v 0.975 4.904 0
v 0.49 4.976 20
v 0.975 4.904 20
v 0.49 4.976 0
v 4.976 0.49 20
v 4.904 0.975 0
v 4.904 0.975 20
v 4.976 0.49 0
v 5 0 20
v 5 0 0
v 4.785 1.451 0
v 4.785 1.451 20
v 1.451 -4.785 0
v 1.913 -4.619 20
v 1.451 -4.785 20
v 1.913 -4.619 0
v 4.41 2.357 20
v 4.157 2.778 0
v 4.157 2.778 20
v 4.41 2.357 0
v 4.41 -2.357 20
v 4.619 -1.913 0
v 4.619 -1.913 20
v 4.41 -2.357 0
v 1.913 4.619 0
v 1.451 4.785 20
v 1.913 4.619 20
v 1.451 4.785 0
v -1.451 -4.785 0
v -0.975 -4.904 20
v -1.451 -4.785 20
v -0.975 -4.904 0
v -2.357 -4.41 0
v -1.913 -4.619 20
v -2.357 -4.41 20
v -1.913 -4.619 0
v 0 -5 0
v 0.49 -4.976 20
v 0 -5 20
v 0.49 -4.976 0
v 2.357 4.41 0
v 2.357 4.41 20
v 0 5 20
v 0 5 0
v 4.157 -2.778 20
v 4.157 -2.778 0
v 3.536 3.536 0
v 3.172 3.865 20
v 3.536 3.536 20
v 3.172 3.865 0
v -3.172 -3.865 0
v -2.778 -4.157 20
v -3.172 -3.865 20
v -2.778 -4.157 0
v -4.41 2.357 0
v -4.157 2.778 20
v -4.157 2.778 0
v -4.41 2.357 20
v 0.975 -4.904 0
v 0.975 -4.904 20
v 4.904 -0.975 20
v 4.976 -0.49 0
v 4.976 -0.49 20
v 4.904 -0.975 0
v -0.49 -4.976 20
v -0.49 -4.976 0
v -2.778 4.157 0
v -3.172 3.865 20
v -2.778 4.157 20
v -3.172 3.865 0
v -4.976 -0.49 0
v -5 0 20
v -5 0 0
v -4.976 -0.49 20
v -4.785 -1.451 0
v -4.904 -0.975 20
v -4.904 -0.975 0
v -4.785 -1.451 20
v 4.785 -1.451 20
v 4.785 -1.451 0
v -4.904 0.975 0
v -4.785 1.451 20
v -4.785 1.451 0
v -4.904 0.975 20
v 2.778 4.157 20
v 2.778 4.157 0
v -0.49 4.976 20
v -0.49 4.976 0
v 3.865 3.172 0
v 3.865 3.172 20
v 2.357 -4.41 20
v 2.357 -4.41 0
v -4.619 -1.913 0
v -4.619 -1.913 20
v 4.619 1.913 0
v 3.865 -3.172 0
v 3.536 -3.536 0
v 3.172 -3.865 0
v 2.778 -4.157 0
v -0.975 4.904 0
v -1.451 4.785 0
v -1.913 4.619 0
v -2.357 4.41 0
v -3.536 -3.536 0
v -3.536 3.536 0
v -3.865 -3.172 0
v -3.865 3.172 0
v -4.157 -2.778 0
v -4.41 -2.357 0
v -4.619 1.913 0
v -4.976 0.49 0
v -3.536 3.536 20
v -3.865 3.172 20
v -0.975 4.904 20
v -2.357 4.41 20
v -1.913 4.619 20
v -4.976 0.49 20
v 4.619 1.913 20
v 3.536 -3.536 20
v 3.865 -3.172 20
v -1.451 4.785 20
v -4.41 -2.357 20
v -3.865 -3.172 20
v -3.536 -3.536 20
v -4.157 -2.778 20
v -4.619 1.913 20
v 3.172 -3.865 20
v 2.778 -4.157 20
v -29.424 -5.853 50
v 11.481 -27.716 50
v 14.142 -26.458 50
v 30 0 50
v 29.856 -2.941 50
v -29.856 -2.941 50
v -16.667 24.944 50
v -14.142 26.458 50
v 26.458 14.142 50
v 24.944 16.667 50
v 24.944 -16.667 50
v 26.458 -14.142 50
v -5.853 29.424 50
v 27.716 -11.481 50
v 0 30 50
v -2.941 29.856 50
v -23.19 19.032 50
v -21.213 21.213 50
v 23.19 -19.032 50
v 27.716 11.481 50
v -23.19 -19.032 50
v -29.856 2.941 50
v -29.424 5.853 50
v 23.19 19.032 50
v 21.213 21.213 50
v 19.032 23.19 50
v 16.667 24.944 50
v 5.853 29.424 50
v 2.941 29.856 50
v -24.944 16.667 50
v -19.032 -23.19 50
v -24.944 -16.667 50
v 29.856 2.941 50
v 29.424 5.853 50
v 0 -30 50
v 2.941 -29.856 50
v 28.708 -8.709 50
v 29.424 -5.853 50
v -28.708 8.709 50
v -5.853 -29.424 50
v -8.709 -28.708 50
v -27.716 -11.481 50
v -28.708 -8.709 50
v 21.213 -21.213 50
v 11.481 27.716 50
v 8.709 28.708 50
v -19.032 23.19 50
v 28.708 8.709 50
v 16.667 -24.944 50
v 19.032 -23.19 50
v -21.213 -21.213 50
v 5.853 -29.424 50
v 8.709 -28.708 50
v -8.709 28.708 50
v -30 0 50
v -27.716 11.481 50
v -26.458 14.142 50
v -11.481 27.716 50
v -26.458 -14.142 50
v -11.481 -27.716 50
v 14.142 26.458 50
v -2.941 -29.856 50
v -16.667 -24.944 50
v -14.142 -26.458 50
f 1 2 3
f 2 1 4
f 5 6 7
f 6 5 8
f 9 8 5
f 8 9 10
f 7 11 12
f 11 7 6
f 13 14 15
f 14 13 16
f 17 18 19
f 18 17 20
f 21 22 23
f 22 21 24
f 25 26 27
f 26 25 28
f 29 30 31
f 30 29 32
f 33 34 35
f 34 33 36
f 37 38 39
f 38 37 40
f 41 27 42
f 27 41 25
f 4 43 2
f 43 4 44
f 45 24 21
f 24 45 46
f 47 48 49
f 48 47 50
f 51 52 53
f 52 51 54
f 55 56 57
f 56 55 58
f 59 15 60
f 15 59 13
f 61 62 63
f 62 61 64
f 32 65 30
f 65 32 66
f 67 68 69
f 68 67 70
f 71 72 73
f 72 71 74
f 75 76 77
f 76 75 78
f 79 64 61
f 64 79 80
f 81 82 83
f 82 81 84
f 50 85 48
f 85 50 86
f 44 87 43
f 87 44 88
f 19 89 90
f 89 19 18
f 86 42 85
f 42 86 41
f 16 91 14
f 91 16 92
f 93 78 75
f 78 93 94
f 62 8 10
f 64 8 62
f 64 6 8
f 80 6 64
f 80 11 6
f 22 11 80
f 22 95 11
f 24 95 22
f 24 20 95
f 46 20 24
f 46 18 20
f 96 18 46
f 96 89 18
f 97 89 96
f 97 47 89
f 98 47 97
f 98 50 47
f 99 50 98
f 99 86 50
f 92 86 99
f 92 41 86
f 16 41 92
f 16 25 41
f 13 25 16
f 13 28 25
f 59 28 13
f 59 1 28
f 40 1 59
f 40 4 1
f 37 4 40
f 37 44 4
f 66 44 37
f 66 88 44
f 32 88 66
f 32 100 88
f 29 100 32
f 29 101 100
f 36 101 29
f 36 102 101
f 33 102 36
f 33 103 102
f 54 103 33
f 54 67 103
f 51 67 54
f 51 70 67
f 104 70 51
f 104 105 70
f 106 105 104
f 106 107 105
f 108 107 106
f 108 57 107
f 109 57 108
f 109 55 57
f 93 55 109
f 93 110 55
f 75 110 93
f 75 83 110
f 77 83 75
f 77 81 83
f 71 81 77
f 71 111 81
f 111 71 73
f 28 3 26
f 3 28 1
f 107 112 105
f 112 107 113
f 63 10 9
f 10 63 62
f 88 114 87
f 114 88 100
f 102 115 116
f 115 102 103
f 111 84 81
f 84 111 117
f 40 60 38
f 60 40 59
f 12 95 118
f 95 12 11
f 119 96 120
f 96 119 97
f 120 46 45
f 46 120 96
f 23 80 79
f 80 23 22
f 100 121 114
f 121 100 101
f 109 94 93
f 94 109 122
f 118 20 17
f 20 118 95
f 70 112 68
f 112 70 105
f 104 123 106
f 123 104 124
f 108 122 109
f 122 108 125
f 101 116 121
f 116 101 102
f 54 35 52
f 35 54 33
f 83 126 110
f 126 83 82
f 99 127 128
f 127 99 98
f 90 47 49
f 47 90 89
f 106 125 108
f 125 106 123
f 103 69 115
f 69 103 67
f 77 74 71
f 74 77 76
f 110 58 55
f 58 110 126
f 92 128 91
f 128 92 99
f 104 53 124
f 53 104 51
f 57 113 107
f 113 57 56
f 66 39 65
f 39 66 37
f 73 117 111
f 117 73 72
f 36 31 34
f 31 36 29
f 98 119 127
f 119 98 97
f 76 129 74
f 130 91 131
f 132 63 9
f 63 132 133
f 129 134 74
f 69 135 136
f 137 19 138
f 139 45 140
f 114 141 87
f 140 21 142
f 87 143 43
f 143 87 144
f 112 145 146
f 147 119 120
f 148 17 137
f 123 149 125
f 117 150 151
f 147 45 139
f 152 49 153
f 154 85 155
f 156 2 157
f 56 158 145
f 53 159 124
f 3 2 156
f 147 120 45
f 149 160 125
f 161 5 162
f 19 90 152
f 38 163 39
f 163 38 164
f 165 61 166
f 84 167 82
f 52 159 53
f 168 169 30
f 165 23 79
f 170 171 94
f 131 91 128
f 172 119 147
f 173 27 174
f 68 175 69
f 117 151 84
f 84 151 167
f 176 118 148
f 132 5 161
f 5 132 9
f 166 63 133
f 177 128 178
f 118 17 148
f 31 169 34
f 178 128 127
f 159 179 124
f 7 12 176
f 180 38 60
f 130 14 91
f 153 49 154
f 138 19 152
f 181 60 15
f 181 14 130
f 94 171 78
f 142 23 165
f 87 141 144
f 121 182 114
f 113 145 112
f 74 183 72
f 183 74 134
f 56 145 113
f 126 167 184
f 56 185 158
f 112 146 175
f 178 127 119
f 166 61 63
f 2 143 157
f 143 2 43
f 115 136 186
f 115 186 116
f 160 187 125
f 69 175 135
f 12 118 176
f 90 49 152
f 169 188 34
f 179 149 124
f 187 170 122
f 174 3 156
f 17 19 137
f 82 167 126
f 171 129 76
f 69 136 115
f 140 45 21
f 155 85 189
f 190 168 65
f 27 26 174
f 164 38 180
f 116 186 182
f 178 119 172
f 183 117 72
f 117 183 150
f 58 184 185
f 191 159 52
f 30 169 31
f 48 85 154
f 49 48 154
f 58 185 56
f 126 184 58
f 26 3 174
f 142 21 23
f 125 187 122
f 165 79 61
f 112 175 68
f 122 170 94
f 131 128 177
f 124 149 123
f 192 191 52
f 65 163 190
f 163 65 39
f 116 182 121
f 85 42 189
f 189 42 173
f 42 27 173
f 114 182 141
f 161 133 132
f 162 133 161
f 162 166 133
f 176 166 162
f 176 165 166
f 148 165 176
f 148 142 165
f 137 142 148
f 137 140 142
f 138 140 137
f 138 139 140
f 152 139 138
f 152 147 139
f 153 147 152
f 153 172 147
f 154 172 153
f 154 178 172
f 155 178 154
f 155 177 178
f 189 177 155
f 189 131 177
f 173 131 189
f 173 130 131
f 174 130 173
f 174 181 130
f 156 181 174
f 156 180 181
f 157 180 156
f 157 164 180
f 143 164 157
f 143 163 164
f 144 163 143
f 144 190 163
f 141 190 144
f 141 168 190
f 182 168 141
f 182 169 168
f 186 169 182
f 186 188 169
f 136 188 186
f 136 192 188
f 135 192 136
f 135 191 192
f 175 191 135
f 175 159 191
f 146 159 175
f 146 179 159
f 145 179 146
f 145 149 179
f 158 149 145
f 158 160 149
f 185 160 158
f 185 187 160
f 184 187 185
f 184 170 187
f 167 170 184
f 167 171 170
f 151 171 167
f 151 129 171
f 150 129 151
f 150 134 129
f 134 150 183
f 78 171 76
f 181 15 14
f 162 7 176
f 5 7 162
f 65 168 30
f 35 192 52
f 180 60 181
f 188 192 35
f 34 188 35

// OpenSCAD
// Lab Funnel Design
// Wall thickness: 1.6 mm
// Spout: 10 mm outer diameter, 20 mm tall (z = 0 to z = 20)
// Cone: expands from 10 mm outer diameter at z = 20 to 60 mm outer diameter at z = 50
// Open at top and bottom for liquid flow

$fn = 64;

// Dimensions
wall_thickness = 1.6;
spout_outer_diameter = 10;
spout_height = 20;
cone_top_diameter = 10;
cone_bottom_diameter = 60;
cone_height = 30; // from z=20 to z=50

// Calculate inner diameters
spout_inner_diameter = spout_outer_diameter - 2 * wall_thickness;
cone_top_inner_diameter = cone_top_diameter - 2 * wall_thickness;
cone_bottom_inner_diameter = cone_bottom_diameter - 2 * wall_thickness;

// Spout (outer cylinder)
module spout_outer() {
    translate([0, 0, 0])
    cylinder(h = spout_height, d = spout_outer_diameter, center = false);
}

// Spout (inner cylinder - for hollowing)
module spout_inner() {
    translate([0, 0, -0.01])
    cylinder(h = spout_height + 0.02, d = spout_inner_diameter, center = false);
}

// Cone (outer cone)
module cone_outer() {
    translate([0, 0, spout_height])
    cylinder(h = cone_height, 
             d1 = cone_top_diameter, 
             d2 = cone_bottom_diameter, 
             center = false);
}

// Cone (inner cone - for hollowing)
module cone_inner() {
    translate([0, 0, spout_height - 0.01])
    cylinder(h = cone_height + 0.02, 
             d1 = cone_top_inner_diameter, 
             d2 = cone_bottom_inner_diameter, 
             center = false);
}

// Build the funnel
module funnel() {
    // Create outer shape
    union() {
        spout_outer();
        cone_outer();
    }
    
    // Subtract inner hollow - make sure to subtract from the union
    difference() {
        union() {
            spout_outer();
            cone_outer();
        }
        spout_inner();
        cone_inner();
    }
}

funnel();
